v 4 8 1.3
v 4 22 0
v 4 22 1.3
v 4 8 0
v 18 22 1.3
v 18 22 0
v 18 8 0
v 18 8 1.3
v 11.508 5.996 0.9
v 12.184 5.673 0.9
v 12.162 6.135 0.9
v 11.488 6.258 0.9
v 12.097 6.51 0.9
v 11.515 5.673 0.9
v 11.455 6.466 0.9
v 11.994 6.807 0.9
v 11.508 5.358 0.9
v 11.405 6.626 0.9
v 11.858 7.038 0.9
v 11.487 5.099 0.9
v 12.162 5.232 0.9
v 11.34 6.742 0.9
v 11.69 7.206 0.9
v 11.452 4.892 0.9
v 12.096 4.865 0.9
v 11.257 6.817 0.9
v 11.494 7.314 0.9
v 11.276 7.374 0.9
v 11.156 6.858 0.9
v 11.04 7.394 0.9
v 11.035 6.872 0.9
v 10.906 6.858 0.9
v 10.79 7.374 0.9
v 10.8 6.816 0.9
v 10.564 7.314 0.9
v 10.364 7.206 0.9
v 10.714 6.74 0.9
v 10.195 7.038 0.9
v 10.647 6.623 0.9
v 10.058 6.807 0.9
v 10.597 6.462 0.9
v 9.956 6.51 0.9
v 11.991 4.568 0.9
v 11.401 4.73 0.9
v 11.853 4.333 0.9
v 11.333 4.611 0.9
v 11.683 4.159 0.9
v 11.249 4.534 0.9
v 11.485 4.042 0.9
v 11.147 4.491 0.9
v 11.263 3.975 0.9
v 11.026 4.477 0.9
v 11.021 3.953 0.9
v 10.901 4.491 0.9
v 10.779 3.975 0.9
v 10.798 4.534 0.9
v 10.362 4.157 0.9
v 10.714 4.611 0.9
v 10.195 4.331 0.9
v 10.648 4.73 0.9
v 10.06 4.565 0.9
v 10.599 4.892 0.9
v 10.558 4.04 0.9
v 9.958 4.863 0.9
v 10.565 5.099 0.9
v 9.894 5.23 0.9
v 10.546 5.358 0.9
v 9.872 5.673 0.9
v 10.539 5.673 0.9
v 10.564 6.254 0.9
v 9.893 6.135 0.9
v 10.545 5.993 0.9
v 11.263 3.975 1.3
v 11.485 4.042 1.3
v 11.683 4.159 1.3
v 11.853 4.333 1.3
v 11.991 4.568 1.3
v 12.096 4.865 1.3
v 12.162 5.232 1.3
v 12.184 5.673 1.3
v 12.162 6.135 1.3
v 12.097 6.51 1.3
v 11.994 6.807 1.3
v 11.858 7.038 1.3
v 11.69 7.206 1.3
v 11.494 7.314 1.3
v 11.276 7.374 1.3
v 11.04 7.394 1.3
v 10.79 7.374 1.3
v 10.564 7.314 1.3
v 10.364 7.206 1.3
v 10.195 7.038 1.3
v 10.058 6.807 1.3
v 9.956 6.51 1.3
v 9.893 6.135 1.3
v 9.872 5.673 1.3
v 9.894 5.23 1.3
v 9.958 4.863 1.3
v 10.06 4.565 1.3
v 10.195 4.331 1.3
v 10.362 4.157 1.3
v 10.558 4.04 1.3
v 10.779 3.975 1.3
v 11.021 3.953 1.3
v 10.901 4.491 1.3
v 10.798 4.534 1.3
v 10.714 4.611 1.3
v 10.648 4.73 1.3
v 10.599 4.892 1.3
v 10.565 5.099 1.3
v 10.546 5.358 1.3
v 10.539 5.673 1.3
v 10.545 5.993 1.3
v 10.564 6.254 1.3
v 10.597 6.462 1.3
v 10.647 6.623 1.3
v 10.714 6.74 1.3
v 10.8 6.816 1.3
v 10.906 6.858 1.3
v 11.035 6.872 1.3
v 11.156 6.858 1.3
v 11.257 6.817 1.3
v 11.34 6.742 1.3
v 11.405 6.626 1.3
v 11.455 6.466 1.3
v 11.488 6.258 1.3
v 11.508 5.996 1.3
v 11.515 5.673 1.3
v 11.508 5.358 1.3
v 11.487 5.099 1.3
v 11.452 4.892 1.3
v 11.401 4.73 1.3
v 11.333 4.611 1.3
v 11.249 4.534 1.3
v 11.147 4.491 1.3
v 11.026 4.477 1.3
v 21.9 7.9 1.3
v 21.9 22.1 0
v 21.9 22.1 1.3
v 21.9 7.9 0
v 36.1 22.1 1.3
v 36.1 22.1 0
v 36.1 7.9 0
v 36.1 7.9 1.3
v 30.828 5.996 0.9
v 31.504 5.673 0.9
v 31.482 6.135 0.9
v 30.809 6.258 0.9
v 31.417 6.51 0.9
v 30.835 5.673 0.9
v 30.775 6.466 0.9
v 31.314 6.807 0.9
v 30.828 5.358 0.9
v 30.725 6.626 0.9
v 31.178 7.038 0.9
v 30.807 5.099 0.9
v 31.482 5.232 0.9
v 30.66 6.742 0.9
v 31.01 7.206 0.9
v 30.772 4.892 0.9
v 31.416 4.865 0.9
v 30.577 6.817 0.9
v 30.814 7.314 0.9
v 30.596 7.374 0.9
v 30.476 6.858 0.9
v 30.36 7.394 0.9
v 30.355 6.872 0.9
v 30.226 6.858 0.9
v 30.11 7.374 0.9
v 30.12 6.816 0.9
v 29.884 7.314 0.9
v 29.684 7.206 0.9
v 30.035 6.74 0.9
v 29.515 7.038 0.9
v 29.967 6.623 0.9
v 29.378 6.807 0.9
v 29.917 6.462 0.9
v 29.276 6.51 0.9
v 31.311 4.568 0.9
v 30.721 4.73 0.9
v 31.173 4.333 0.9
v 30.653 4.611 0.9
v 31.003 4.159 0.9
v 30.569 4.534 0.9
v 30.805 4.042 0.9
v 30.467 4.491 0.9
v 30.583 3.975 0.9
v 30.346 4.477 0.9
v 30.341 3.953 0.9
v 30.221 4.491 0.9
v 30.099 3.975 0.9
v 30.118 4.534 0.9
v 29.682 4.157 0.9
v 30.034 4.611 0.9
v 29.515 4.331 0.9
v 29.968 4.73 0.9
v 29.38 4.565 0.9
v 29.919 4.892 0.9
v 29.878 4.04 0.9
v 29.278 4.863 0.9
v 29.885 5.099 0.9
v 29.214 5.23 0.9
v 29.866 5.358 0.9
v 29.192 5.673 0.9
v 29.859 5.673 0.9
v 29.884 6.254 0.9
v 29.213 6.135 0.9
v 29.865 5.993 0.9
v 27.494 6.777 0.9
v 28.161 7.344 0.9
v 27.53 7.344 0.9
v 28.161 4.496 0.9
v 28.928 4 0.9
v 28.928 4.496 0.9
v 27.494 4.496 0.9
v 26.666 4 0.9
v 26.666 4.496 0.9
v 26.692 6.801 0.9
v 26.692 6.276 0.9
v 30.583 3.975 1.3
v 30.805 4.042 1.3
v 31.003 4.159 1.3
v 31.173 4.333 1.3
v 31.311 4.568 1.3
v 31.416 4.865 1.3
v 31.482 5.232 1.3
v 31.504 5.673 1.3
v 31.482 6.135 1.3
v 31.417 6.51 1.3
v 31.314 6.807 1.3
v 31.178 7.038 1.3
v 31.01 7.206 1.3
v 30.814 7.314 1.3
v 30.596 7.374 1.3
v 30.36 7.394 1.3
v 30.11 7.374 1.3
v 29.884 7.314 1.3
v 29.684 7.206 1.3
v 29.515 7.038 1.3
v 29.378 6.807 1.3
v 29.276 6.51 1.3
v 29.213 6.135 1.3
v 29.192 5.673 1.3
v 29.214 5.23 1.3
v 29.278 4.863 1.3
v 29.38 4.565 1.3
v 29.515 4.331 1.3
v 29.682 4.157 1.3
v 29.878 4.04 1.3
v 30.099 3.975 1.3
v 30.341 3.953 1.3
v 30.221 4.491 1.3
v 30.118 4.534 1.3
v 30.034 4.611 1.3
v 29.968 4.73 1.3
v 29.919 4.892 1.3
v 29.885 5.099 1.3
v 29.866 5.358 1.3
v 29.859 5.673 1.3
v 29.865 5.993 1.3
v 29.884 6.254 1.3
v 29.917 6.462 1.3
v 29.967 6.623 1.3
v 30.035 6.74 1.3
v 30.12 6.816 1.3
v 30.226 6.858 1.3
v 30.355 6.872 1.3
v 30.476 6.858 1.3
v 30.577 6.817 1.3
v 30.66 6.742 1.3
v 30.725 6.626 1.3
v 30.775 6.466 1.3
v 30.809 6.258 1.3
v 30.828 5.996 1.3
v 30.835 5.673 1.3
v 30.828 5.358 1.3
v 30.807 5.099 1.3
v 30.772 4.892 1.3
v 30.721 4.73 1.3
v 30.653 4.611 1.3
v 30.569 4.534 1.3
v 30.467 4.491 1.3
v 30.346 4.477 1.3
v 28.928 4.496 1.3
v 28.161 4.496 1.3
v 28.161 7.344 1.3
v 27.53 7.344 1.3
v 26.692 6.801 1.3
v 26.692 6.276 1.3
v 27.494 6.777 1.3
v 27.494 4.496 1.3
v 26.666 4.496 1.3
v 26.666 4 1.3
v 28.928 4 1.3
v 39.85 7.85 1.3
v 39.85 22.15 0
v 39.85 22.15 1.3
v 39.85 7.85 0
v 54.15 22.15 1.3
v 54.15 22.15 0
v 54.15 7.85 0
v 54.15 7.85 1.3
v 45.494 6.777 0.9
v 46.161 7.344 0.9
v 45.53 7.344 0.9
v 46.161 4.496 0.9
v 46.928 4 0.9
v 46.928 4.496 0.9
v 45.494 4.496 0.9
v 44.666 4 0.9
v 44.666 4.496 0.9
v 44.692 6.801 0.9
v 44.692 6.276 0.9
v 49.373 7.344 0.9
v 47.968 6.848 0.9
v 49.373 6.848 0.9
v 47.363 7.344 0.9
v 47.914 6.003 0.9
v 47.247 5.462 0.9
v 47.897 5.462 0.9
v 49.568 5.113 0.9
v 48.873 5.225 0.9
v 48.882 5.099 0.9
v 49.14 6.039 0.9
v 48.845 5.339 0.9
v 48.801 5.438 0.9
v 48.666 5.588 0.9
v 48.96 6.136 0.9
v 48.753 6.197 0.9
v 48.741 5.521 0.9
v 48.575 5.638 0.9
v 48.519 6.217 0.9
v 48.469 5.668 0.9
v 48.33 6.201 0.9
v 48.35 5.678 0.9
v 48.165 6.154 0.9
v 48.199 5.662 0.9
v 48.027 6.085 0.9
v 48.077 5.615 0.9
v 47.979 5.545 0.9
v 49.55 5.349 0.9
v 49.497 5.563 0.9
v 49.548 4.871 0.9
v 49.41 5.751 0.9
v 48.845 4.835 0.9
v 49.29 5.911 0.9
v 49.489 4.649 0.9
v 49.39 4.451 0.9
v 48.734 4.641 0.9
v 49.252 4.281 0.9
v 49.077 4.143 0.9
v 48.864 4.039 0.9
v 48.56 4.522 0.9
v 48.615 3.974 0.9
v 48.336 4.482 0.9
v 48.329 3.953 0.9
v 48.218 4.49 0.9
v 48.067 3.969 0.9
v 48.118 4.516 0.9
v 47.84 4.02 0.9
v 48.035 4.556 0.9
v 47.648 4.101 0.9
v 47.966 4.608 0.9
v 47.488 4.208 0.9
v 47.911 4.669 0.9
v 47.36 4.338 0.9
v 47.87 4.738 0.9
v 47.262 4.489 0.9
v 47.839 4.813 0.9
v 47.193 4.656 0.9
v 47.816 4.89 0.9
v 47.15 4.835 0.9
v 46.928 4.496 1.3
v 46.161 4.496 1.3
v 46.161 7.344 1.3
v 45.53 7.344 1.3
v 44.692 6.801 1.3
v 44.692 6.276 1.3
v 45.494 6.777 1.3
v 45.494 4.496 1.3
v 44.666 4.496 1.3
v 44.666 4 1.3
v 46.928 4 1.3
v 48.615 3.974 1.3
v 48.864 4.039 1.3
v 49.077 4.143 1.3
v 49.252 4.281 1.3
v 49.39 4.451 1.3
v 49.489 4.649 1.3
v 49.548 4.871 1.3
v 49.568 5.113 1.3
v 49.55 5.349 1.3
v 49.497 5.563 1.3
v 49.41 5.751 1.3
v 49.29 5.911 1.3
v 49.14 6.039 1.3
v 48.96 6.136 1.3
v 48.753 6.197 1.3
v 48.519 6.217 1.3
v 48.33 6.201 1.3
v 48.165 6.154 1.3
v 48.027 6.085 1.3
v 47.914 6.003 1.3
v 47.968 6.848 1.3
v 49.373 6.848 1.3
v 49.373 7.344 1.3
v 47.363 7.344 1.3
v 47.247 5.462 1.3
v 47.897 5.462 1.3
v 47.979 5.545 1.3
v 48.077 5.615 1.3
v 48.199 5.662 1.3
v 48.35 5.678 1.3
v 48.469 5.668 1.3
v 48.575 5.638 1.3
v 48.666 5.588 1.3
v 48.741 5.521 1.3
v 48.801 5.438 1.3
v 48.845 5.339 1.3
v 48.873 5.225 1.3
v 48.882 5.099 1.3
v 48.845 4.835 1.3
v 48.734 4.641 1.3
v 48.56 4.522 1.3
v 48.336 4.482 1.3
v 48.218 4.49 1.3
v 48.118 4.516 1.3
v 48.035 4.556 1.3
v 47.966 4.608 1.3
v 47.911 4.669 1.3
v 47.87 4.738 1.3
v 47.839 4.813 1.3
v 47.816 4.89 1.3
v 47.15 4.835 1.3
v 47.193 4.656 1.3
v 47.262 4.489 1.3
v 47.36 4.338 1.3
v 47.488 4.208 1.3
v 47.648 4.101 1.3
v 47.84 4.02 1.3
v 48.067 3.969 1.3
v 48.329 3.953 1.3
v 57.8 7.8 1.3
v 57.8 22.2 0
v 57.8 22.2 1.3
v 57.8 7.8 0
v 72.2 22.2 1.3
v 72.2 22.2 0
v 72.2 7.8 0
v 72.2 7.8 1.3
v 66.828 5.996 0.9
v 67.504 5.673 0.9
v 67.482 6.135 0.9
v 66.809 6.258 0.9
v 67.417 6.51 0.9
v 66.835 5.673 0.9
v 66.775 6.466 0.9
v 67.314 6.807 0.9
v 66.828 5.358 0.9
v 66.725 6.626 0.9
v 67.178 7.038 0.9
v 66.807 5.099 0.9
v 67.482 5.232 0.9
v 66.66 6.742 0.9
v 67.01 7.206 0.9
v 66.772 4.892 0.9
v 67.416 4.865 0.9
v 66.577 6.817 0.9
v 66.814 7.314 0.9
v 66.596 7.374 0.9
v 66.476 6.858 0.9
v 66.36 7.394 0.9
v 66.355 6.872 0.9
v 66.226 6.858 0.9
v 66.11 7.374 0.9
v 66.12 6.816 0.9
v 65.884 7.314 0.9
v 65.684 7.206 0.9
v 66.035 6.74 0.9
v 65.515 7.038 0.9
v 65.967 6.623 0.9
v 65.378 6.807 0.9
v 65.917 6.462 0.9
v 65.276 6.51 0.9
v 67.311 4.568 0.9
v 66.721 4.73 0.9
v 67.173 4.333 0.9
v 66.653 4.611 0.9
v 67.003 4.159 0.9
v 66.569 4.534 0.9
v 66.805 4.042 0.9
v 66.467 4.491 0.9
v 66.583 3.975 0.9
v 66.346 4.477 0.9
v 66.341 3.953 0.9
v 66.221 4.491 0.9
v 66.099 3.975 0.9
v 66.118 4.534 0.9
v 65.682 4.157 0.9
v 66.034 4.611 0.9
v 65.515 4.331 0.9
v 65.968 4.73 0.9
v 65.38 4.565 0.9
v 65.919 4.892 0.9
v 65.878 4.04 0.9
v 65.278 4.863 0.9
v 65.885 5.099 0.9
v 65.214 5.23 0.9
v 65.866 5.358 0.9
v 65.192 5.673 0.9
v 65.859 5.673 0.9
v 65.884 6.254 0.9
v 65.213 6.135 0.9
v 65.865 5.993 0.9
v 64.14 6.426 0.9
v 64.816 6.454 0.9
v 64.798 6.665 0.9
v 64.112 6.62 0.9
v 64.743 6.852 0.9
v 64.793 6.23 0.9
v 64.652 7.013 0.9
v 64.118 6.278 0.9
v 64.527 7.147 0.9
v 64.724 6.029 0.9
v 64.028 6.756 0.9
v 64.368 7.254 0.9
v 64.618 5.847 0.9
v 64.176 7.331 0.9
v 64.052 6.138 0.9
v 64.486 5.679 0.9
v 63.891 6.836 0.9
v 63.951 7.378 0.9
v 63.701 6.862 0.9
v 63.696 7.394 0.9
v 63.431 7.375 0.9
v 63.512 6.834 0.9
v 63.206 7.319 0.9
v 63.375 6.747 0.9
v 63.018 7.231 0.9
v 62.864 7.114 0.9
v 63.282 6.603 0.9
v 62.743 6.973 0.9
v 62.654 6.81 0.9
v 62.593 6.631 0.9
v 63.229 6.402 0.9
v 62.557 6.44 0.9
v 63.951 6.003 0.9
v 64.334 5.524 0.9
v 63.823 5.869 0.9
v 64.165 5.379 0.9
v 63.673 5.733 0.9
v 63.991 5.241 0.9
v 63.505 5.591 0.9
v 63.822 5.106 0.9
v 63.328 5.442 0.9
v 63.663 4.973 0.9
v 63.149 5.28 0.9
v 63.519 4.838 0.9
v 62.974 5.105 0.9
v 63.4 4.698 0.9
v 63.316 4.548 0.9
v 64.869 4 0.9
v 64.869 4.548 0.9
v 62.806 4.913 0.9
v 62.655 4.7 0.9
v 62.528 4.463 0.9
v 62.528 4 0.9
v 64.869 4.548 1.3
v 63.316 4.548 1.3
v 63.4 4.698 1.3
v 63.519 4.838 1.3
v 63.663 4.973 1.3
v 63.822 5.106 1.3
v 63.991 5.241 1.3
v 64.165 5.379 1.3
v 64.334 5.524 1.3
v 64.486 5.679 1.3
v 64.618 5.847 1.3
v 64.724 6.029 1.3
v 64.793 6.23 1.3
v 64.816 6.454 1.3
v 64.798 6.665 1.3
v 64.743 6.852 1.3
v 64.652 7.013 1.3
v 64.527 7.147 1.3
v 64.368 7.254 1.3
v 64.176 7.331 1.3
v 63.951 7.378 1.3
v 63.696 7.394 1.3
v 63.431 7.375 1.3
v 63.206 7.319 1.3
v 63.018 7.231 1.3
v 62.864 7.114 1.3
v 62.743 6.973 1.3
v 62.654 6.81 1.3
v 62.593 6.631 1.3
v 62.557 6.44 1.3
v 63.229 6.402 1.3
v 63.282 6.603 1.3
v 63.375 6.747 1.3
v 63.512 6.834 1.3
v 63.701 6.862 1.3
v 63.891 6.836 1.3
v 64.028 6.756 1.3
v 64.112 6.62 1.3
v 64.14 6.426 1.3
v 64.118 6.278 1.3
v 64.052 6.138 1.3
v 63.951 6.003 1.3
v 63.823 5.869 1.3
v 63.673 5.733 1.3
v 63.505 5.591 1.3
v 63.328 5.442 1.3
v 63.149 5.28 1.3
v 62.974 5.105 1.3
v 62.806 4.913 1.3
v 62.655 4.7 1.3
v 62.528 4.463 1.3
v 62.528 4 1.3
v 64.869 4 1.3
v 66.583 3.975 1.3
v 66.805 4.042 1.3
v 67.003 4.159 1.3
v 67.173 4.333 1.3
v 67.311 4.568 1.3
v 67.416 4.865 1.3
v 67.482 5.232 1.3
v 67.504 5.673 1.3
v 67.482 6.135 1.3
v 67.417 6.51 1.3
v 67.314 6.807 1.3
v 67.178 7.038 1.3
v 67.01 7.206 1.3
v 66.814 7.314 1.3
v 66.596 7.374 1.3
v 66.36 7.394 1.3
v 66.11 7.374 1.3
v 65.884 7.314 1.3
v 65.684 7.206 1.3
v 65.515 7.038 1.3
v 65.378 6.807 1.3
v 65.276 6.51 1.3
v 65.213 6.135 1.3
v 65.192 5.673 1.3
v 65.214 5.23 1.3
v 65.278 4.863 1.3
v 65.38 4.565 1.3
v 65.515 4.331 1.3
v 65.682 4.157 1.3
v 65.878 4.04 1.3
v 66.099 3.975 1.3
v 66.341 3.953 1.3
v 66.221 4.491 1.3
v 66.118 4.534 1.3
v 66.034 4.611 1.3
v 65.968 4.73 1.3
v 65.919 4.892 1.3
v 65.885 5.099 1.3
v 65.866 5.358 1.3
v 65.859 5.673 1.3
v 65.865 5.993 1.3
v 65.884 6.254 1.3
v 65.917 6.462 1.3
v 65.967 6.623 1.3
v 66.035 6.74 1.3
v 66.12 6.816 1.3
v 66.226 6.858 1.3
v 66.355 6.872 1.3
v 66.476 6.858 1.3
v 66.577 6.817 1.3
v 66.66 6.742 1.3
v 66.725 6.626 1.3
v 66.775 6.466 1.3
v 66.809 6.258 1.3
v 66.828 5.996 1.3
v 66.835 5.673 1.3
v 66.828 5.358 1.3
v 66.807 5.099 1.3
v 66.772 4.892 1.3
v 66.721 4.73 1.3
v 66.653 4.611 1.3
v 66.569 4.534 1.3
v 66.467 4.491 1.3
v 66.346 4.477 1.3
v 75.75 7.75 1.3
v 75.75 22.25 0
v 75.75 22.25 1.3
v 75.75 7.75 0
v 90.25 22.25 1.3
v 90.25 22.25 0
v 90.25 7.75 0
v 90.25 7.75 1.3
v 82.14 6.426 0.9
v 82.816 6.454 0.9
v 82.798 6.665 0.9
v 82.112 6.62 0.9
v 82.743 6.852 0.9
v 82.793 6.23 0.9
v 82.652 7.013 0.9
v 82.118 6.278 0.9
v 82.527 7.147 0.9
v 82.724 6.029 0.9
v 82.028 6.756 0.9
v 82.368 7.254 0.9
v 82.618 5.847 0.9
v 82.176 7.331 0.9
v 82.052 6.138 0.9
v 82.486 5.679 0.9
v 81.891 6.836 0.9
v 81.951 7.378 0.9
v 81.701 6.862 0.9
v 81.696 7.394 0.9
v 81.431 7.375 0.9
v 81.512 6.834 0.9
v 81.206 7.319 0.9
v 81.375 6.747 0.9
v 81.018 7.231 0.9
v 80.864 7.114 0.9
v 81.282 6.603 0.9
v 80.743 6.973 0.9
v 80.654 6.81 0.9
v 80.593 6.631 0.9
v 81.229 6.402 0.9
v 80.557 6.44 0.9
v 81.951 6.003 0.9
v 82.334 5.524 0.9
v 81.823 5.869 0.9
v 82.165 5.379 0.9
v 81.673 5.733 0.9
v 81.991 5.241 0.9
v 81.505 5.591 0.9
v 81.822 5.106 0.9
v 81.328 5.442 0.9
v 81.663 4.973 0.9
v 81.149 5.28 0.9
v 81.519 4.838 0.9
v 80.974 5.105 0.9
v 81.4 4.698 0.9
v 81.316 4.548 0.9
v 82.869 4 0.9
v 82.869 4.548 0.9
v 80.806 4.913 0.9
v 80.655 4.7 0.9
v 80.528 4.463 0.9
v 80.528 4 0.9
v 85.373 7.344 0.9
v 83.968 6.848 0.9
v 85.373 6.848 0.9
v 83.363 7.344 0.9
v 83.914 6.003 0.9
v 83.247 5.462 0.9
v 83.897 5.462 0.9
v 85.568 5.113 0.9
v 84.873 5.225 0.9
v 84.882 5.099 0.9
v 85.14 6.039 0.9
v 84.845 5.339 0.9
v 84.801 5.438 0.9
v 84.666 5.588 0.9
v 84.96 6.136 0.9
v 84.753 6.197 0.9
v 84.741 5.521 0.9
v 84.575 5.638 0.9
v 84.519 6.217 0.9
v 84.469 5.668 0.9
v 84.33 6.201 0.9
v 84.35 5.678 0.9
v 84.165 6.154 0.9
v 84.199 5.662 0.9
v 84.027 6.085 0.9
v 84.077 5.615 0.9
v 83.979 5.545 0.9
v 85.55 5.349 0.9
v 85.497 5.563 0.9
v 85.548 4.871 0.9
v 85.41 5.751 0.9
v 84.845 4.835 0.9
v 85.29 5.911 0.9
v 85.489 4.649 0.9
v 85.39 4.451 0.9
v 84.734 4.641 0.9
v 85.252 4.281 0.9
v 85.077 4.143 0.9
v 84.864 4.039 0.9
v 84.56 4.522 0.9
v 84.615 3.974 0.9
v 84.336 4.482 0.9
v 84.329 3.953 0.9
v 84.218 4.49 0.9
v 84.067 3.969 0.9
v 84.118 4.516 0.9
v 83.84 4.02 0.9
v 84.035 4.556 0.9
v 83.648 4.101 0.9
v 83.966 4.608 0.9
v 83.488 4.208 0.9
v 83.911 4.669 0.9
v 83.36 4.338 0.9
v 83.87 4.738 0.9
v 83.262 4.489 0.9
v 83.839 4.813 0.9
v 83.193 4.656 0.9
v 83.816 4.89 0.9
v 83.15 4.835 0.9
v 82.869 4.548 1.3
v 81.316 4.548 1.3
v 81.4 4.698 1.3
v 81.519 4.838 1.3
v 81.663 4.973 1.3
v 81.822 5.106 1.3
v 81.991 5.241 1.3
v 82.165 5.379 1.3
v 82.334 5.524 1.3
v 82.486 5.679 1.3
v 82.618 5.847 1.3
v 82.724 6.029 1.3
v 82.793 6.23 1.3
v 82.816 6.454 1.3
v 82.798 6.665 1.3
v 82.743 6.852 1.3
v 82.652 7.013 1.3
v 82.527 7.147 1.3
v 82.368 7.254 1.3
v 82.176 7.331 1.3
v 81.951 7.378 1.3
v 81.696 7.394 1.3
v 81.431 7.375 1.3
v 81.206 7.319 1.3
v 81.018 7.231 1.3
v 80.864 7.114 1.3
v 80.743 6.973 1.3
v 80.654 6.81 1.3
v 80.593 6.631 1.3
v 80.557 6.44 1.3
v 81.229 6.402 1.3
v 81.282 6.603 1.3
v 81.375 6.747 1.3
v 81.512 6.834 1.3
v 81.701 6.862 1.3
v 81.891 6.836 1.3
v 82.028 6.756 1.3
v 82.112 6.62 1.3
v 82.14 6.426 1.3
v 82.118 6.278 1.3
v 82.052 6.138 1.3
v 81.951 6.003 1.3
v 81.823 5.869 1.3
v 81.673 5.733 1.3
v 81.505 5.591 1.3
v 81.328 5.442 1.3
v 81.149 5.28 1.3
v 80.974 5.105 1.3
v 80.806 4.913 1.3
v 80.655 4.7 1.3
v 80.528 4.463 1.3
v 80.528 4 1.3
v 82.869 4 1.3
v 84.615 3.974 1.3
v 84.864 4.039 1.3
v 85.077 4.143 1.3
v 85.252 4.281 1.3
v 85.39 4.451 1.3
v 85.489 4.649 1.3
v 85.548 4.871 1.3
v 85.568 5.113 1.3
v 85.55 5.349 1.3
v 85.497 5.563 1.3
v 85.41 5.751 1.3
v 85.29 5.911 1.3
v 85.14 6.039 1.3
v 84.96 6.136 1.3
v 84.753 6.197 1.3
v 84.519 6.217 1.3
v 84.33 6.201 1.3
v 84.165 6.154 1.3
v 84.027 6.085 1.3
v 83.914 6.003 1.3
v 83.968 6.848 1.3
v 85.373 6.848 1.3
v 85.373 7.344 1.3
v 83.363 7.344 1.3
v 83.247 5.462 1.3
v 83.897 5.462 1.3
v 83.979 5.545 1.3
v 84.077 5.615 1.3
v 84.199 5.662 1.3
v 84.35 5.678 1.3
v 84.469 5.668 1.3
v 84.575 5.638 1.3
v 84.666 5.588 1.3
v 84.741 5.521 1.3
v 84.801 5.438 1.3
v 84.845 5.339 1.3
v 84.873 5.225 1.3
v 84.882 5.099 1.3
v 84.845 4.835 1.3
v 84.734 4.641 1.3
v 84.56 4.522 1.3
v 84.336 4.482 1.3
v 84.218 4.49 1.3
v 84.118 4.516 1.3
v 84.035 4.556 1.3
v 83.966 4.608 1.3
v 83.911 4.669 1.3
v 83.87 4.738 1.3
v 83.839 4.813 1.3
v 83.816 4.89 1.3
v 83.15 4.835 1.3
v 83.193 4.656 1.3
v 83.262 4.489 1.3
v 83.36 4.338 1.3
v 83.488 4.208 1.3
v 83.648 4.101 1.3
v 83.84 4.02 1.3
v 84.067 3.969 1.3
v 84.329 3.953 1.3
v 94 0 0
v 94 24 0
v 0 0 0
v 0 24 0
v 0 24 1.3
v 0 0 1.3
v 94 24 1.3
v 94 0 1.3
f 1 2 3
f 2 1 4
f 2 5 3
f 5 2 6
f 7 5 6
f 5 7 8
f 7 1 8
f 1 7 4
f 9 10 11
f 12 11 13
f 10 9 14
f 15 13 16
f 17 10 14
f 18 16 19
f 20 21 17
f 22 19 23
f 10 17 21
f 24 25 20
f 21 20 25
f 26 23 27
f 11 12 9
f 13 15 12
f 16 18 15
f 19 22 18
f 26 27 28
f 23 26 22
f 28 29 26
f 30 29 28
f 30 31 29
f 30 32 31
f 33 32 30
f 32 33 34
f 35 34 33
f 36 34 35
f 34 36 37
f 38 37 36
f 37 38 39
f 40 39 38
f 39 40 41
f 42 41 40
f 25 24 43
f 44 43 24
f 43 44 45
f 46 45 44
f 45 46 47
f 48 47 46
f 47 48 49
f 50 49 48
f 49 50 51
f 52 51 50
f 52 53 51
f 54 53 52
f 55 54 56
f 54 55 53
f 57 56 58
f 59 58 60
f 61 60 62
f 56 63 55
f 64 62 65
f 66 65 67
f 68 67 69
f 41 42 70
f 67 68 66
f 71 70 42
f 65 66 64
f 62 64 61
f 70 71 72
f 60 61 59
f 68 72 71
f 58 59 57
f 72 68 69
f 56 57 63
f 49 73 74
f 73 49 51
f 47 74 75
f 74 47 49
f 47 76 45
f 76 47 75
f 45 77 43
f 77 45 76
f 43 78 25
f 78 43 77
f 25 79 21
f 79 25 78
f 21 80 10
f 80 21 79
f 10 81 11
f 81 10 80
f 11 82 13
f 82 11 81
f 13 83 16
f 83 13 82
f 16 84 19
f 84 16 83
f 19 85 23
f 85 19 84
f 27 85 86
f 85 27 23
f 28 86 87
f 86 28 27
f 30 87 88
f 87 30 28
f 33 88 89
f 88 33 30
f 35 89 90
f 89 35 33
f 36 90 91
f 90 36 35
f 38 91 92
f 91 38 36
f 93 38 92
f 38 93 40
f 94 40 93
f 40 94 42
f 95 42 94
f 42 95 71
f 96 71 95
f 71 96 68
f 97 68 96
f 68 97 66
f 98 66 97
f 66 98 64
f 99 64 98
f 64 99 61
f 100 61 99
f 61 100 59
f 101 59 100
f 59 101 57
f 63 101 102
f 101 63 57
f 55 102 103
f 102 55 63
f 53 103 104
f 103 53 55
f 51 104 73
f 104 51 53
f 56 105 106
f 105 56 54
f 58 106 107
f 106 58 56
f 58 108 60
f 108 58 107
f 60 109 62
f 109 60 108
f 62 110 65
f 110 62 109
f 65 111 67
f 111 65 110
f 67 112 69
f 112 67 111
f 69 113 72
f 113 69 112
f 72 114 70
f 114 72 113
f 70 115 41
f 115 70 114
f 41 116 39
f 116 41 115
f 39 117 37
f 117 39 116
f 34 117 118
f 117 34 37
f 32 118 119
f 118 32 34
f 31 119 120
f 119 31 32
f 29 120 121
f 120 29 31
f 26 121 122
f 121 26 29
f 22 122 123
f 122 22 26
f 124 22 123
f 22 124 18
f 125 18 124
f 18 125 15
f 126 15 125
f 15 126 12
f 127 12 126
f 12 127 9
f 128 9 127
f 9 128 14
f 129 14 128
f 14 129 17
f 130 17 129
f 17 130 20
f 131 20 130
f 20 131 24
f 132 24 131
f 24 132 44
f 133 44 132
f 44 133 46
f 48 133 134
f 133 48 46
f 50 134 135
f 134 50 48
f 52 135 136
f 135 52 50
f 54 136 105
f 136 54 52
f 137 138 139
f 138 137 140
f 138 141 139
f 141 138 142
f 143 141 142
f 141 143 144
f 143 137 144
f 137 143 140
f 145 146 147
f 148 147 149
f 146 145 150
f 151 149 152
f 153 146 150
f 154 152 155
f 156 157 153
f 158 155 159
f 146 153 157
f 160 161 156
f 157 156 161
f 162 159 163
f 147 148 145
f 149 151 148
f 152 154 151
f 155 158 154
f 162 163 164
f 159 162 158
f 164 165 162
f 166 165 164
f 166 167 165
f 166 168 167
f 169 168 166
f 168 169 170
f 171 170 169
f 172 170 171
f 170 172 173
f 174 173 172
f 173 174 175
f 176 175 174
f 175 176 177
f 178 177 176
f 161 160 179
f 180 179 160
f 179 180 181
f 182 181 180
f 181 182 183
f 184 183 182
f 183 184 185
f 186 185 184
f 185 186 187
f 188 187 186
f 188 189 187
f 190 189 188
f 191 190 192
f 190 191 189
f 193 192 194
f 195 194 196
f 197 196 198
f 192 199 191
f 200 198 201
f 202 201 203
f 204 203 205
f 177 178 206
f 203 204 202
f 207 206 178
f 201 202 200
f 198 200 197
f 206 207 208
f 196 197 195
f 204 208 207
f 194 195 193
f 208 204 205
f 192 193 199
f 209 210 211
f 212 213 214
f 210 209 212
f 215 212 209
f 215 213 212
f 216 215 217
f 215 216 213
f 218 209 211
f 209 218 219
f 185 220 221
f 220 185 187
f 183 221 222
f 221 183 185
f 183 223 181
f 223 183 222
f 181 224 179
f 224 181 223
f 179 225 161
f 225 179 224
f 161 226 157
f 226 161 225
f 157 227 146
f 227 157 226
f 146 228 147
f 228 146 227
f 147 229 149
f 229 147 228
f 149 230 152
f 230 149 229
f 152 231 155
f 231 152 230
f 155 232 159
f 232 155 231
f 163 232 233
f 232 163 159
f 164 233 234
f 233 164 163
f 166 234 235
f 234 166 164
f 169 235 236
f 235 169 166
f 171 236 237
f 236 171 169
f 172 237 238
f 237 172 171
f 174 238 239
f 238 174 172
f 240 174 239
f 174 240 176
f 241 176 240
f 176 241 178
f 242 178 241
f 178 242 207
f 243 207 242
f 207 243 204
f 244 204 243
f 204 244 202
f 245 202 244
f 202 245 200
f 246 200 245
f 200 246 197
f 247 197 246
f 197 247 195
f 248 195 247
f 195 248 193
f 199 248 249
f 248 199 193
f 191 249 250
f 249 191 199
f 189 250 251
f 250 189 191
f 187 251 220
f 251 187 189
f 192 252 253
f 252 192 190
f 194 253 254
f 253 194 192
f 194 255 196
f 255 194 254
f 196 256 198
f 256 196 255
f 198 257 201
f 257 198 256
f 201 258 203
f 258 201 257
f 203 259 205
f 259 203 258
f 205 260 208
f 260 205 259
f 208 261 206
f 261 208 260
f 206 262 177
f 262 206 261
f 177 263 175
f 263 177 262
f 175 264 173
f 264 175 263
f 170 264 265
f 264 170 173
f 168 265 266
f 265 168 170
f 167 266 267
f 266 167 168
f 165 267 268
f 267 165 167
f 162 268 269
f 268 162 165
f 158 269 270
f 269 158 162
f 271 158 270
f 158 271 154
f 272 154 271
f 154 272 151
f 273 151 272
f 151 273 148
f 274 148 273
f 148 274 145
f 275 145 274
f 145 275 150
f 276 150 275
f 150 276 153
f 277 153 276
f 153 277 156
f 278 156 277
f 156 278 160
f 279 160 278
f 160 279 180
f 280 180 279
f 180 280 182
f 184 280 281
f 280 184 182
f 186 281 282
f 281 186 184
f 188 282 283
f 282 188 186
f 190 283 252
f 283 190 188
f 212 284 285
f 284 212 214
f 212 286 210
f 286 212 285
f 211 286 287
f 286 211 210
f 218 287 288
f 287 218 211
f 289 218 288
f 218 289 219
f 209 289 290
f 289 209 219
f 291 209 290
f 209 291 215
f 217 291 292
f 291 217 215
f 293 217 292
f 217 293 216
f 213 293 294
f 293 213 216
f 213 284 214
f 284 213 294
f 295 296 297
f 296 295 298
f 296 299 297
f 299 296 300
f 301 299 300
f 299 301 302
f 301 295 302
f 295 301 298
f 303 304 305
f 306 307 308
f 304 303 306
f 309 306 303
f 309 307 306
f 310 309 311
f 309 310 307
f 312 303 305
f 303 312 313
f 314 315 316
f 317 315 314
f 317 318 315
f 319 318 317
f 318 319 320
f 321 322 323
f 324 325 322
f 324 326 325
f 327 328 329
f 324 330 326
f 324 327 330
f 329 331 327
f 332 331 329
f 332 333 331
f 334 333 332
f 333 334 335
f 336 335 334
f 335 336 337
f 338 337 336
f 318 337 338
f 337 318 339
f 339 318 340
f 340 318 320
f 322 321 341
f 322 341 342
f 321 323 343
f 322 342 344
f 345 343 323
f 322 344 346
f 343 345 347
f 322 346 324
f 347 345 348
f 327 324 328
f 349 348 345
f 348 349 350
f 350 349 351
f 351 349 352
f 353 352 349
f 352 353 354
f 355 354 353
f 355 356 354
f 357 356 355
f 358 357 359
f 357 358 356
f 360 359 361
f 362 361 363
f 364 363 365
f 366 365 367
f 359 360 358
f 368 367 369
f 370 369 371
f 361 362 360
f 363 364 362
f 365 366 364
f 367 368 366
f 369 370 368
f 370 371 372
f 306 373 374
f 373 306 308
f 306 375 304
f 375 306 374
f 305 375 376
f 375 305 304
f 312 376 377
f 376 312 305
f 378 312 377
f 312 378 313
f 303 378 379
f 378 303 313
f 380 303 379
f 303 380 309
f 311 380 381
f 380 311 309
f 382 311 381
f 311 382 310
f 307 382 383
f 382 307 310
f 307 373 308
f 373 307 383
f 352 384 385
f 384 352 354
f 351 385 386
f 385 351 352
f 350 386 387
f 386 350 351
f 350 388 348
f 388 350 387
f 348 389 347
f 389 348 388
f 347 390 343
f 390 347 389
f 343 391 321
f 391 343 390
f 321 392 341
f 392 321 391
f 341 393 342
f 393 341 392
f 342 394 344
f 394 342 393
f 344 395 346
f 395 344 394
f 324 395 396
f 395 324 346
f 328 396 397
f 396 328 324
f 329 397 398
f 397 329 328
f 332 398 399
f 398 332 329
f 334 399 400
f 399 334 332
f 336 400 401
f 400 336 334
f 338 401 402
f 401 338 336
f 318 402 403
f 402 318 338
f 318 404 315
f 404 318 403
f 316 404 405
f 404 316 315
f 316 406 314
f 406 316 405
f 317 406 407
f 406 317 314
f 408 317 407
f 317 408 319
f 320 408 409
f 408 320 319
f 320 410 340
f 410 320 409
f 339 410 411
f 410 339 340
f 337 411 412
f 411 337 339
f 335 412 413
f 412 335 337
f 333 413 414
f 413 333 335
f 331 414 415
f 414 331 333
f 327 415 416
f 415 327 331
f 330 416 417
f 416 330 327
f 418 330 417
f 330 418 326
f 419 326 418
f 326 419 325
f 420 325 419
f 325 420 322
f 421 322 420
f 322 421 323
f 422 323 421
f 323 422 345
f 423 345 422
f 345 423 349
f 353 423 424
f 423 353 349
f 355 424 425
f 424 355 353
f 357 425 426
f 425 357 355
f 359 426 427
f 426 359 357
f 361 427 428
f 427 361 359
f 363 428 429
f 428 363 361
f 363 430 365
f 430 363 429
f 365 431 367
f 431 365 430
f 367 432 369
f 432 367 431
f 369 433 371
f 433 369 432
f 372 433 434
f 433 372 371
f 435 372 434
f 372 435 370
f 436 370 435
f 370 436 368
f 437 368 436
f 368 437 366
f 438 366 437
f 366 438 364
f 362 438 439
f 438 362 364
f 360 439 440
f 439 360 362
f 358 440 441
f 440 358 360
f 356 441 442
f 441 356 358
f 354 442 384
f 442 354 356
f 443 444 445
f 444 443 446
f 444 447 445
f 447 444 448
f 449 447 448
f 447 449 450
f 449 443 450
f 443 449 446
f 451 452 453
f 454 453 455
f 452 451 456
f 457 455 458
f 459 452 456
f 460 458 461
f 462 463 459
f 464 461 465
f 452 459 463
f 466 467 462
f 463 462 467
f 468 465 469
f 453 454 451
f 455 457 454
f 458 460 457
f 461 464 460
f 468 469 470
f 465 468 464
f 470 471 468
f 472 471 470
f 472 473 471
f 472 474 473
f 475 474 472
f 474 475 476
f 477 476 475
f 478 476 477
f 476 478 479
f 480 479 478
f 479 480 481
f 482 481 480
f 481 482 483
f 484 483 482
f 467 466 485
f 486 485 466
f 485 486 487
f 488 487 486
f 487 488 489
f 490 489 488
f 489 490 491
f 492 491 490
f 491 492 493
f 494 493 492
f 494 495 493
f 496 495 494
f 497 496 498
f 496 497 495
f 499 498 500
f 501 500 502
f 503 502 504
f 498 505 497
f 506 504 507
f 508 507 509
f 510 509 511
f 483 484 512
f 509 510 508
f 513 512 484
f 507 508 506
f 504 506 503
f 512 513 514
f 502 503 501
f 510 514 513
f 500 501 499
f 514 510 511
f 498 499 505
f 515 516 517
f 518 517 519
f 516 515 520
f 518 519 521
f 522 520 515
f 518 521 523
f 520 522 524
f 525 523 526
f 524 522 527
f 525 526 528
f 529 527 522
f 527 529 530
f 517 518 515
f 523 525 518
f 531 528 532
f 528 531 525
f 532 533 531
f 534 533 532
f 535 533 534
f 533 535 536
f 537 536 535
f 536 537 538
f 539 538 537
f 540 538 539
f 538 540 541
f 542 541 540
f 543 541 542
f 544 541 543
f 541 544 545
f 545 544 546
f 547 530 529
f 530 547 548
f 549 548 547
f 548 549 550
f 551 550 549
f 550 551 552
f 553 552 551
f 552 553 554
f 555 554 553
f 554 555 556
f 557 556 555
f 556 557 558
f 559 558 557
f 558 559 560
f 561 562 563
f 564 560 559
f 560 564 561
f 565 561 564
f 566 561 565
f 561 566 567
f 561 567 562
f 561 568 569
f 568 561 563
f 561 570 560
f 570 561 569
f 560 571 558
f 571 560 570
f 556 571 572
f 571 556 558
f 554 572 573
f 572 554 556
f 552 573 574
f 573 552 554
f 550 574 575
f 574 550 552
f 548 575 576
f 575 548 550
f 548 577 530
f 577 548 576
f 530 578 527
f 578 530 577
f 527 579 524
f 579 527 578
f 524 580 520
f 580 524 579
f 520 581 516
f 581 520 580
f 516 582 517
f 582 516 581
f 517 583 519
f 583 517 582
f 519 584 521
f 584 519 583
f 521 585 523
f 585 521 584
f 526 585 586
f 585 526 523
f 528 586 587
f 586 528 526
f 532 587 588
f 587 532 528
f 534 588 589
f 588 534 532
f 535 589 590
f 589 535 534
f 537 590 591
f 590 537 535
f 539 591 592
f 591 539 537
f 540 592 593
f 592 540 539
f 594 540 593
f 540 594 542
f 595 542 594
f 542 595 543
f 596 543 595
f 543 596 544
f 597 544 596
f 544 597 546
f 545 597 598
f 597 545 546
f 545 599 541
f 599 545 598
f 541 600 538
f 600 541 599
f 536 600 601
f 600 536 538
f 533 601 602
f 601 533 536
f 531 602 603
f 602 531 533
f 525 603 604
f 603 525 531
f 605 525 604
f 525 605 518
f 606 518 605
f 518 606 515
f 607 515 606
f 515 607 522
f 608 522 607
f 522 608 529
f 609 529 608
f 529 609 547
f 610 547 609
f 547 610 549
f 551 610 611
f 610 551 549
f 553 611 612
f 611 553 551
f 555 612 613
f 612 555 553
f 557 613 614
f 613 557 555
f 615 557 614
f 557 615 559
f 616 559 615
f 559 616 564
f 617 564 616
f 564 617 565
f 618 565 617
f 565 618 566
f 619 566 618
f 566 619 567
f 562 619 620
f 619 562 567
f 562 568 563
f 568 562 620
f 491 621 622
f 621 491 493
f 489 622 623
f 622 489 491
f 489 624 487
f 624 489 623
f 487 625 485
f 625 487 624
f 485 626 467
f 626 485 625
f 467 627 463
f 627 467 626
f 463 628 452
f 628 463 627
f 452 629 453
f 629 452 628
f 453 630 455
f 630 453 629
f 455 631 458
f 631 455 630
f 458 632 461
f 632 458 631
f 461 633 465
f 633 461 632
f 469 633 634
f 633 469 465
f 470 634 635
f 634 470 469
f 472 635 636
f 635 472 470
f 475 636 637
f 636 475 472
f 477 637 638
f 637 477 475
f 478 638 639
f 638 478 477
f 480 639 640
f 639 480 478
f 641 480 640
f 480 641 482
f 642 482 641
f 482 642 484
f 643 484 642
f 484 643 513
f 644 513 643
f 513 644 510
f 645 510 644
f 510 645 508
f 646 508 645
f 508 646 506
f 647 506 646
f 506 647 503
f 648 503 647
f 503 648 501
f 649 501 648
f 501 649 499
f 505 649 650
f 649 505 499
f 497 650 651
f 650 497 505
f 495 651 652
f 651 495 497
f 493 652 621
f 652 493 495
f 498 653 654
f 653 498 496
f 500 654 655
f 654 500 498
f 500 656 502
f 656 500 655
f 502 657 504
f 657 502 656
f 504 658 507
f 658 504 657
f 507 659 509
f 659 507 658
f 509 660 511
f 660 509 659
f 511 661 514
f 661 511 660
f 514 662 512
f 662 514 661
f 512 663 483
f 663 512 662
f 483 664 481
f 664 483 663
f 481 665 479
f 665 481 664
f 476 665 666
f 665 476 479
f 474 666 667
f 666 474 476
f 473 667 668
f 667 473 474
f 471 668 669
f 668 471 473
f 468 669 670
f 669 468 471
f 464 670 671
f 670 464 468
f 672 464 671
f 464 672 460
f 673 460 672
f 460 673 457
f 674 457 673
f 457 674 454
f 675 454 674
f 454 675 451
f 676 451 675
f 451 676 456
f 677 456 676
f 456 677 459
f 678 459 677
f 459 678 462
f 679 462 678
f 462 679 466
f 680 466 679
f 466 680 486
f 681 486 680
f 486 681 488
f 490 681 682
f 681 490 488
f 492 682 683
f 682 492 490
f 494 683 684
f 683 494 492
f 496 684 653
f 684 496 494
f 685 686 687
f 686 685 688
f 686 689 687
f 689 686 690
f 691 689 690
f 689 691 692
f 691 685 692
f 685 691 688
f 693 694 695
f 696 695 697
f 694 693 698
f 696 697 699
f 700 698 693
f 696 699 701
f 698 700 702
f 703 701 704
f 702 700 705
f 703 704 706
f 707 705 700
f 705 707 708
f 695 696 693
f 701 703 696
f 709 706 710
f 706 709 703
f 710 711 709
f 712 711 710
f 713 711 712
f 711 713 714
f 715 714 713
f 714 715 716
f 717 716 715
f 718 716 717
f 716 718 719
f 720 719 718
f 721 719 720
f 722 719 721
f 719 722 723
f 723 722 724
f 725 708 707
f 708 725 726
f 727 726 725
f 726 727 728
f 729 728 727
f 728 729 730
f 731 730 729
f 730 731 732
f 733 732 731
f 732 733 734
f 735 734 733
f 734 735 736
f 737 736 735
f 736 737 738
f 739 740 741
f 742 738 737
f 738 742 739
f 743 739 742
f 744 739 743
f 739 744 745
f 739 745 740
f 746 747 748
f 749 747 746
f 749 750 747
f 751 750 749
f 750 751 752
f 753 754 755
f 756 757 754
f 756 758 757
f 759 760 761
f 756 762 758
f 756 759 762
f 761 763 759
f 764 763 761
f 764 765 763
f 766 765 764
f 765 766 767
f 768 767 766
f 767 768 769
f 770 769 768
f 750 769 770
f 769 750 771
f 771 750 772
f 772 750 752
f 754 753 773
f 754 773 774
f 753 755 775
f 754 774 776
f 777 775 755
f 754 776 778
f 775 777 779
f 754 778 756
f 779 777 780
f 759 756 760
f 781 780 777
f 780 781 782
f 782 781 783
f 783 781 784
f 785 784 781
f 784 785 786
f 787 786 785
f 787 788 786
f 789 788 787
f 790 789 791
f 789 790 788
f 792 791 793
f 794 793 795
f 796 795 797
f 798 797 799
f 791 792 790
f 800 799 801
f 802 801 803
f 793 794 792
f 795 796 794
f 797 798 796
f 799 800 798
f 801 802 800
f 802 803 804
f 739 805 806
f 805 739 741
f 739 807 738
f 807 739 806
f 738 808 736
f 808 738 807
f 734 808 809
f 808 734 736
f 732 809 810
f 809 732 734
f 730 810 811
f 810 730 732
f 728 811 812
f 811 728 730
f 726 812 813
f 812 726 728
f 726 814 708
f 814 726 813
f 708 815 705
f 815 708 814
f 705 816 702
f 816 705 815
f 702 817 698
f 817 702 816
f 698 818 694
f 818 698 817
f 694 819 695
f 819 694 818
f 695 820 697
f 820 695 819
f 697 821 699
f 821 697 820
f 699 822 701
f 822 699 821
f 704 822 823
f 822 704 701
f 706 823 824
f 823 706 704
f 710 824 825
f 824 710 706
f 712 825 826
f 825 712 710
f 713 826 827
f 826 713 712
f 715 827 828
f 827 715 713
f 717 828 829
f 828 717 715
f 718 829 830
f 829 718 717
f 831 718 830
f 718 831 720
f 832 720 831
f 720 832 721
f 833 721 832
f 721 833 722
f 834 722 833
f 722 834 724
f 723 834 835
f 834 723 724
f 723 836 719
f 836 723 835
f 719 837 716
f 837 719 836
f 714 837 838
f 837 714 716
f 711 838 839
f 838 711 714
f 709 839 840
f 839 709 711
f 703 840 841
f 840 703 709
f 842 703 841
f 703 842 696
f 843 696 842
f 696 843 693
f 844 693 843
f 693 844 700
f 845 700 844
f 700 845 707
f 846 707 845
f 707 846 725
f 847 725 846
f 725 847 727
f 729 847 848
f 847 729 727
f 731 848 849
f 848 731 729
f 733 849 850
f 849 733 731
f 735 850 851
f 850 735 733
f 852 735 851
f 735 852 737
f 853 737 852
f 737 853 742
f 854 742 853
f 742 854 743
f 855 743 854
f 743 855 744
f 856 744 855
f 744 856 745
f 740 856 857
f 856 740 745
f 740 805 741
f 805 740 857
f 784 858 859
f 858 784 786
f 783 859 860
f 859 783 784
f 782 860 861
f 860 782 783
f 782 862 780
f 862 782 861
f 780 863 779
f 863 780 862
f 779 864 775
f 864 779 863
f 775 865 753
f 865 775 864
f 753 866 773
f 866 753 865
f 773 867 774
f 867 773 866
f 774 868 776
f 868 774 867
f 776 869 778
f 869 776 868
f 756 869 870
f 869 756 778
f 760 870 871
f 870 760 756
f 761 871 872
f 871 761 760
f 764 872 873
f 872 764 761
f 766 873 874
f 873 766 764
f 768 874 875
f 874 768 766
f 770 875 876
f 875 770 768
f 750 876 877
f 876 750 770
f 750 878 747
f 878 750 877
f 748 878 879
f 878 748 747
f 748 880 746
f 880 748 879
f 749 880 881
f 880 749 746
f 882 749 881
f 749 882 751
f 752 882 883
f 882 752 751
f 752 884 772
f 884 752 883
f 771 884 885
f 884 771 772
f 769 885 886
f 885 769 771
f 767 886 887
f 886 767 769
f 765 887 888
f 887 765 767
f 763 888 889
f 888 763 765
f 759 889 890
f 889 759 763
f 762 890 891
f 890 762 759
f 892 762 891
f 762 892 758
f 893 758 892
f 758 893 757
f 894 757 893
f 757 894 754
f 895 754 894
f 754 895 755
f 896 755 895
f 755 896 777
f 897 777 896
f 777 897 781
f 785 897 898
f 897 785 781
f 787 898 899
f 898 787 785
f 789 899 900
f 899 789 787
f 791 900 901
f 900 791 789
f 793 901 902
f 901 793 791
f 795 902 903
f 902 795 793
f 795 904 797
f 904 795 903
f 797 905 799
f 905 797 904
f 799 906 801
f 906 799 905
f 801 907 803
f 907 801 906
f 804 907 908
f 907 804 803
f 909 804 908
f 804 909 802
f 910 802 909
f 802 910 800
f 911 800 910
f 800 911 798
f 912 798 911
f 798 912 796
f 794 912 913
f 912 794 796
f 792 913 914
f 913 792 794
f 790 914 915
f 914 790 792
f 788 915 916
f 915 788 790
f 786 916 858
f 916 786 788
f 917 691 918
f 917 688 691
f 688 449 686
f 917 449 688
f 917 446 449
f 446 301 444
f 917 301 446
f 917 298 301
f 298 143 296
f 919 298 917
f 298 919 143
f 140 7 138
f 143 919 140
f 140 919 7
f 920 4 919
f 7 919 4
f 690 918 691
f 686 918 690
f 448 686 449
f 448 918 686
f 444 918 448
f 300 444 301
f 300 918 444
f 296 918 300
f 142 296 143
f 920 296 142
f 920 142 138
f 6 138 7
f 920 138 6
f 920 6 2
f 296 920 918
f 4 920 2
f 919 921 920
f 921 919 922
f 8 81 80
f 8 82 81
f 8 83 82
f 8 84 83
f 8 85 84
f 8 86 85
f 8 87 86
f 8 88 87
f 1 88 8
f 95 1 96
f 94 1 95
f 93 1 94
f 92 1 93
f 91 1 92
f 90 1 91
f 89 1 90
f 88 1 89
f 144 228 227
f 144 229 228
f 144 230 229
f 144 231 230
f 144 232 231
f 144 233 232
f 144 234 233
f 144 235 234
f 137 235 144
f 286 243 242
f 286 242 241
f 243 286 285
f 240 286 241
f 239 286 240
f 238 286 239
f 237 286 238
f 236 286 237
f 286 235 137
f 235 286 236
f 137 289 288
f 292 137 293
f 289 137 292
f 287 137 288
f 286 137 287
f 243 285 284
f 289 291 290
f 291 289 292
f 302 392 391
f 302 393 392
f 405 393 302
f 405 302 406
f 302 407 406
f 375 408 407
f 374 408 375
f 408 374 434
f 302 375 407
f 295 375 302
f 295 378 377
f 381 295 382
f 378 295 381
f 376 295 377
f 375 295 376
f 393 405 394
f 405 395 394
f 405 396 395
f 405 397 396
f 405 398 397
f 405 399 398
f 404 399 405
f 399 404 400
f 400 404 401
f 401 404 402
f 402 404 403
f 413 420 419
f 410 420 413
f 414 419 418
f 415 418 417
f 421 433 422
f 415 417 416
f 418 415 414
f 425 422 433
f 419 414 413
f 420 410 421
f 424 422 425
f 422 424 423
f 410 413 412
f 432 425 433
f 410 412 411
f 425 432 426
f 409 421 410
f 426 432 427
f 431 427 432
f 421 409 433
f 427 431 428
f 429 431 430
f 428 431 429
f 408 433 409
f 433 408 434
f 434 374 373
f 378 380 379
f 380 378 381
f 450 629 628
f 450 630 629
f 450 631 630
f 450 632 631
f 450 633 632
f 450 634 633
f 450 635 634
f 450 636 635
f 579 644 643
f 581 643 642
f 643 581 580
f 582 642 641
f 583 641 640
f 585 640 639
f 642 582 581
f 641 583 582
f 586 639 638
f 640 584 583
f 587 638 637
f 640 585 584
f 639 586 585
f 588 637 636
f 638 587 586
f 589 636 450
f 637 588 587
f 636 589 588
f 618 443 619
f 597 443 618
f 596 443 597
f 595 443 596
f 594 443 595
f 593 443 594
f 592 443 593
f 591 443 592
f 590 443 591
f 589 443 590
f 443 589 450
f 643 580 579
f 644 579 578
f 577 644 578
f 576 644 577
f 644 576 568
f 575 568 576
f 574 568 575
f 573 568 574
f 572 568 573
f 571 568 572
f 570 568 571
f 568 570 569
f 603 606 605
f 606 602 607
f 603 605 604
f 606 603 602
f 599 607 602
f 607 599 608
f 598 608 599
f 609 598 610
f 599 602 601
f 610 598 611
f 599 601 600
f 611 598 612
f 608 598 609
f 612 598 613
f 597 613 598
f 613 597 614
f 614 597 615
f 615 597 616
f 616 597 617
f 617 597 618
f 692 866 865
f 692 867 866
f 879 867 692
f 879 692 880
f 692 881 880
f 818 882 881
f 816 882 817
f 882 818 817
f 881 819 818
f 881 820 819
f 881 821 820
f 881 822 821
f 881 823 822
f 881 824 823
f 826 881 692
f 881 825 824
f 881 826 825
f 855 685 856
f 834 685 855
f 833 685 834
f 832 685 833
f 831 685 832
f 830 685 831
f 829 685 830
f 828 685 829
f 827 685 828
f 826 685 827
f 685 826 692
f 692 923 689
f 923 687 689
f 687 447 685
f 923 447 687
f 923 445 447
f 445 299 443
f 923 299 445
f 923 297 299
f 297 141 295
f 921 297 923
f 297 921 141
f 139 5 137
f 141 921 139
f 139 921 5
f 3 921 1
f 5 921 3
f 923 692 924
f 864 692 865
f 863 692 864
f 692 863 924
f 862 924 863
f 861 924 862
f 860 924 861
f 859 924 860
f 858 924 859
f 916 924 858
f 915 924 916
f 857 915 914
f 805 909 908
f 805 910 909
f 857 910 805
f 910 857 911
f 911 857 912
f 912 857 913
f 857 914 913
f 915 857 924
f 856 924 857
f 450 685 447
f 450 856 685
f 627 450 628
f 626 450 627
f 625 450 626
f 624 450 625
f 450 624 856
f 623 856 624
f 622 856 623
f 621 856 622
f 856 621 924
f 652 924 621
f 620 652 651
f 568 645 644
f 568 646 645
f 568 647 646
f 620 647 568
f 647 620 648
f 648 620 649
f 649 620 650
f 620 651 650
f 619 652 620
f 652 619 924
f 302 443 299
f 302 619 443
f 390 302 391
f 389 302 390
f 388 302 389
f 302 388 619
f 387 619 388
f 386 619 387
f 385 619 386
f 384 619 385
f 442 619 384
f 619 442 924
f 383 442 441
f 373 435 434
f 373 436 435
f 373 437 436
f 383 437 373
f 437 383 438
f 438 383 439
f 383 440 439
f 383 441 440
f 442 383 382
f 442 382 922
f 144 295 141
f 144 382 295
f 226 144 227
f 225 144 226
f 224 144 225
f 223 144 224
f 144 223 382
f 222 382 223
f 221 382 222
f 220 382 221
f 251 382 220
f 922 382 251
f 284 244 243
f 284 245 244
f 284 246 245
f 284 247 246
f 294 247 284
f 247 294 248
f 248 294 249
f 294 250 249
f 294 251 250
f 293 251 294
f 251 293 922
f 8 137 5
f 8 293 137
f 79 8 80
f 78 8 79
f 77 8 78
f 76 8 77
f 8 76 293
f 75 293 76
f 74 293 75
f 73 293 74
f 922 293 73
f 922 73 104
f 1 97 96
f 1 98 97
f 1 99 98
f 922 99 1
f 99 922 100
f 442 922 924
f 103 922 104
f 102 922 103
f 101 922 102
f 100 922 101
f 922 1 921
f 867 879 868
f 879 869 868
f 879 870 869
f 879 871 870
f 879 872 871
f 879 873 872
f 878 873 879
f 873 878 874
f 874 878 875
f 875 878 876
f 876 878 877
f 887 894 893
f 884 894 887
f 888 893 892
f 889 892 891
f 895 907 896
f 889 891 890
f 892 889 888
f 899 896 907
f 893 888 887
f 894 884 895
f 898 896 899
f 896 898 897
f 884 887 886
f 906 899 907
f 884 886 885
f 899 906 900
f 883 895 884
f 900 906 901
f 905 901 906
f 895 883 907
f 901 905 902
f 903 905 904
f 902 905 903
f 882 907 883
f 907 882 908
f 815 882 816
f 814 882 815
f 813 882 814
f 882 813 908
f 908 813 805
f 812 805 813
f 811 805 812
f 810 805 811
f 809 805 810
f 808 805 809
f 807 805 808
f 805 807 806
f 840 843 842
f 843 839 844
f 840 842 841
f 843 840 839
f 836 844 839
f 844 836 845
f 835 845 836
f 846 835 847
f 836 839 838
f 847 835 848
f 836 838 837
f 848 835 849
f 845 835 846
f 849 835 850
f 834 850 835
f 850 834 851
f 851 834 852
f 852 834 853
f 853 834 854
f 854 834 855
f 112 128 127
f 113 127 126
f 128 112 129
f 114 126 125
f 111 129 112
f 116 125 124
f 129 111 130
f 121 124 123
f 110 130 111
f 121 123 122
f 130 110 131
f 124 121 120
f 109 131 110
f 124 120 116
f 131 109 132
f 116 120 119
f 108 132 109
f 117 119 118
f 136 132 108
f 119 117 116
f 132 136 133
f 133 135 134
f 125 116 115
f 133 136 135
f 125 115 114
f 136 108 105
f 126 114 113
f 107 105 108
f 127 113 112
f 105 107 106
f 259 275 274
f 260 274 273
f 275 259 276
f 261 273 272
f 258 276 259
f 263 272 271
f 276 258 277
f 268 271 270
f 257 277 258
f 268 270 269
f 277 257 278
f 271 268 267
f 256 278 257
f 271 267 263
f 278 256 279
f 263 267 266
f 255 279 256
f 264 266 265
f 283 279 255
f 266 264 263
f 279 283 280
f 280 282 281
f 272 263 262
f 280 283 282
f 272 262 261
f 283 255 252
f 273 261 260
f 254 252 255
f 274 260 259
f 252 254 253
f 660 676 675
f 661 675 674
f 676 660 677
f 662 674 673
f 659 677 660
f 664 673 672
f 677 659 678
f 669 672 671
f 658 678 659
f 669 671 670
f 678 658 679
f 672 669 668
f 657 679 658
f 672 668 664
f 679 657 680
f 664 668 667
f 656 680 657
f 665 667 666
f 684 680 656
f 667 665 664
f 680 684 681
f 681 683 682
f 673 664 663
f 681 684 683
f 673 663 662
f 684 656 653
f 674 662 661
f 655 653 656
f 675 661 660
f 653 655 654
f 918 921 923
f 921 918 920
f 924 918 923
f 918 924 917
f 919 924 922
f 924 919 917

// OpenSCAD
// Calibration coupon for the 3D-printed switch plate.
//
// Five 14mm Choc cutouts at increasing FDM shrink compensation,
// labeled with the compensation in hundredths of a mm (0, 10, 15, 20,
// 25). Print flat at the same settings you'll use for the real plate
// (0.15mm layers, 100% infill recommended), then press a Choc switch
// into each hole:
//
//   - too tight / needs force: move up
//   - clips engage with a firm push, no wobble: that's your value
//   - drops in loosely / wobbles: move down
//
// Then EITHER set that value as your slicer's hole-horizontal-
// expansion / XY-hole-compensation (and print the plate unmodified),
// OR rebuild the plate STL with -D print_compensation=<value>.
//
// Coupon is ~90x24mm, prints in ~10 minutes.
cutout = 14.0;          // matches switchplate_switch_cutout in ergogen
thickness = 1.3;        // match the plate
compensations = [0, 0.10, 0.15, 0.20, 0.25];
pitch = 18;             // spacing between cutout centres
margin = 2;

coupon_w = pitch * len(compensations) + margin * 2;
coupon_h = cutout + margin * 2 + 6;  // extra 6mm strip for labels

difference() {
  linear_extrude(height = thickness)
    square([coupon_w, coupon_h]);
  for (i = [0 : len(compensations) - 1]) {
    c = compensations[i];
    // Cutout, grown by the compensation on each side
    translate([margin + pitch * i + pitch / 2, margin + cutout / 2 + 6, -1])
      linear_extrude(height = thickness + 2)
        square(cutout + 2 * c, center = true);
    // Engraved label: compensation in hundredths (e.g. "15" = 0.15mm)
    translate([margin + pitch * i + pitch / 2, margin + 2, thickness - 0.4])
      linear_extrude(height = 1)
        text(str(c * 100), size = 3.5, halign = "center",
             font = "Liberation Sans:style=Bold");
  }
}
